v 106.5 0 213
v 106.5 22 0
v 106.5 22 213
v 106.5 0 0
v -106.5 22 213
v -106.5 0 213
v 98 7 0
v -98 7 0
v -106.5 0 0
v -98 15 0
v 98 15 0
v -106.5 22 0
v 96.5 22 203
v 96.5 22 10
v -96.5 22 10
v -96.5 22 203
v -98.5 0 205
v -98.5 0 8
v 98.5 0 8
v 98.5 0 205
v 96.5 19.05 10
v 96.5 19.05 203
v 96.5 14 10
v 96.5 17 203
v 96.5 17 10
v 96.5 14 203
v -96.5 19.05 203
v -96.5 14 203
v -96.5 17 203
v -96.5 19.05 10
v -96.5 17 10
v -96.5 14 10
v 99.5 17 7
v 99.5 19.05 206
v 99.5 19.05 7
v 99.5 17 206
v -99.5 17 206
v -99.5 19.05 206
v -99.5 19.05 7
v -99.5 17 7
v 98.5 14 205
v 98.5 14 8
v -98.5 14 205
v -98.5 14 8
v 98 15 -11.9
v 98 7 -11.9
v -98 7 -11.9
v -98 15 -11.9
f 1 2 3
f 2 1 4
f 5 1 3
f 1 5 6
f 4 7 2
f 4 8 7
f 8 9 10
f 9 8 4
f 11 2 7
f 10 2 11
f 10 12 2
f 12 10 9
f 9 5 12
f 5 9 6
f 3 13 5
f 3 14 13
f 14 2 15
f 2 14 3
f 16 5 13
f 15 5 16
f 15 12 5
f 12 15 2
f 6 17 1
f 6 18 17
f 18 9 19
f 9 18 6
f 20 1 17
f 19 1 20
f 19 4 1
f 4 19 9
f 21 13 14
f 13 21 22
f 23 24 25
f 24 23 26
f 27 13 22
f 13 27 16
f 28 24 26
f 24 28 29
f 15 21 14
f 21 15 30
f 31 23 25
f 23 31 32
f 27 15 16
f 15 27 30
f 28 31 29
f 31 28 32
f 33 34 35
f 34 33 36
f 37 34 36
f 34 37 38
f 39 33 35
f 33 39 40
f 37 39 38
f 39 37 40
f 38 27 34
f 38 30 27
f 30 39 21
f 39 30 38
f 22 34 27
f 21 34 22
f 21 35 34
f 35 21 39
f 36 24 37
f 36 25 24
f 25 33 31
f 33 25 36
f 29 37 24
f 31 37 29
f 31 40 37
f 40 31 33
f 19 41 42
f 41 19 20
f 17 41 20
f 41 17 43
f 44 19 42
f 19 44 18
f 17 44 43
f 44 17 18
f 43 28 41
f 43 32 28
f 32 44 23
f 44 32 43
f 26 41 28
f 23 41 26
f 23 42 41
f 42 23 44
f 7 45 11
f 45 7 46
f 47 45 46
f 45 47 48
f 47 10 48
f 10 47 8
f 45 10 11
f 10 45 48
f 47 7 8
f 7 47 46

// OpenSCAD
// file: params.scad
// ─────────────────────────────────────────────────────────────────────────────
//  params.scad — shared dimensions for every printed part. Edit HERE, once.
//
//  Almost everything is driven off measured hardware. The two things you MUST
//  verify with calipers on your actual parts before printing the base/frame:
//    • panel_w / panel_h / panel_depth  (your 64×64 module's real size)
//    • the 28BYJ-48 mounting-tab hole spacing (usually 35 mm)
//  Defaults below are typical values for a P3 64×64 panel + a stock 28BYJ-48.
// ─────────────────────────────────────────────────────────────────────────────

// Global smoothness
$fn = 120;

// ── RGB matrix panel (P3 64×64) ──────────────────────────────────────────────
panel_px     = 64;
panel_pitch  = 3.0;                 // P3 = 3 mm pixel pitch
panel_w      = panel_px * panel_pitch;   // ≈ 192 mm (measure yours!)
panel_h      = panel_px * panel_pitch;   // ≈ 192 mm
panel_depth  = 14;                  // module thickness incl. LEDs (no connectors)
panel_border = 2;                   // dead PCB border around the lit area

// ── Acrylic diffuser ─────────────────────────────────────────────────────────
diffuser_thick = 2.0;               // frosted acrylic sheet thickness
diffuser_gap   = 3.0;               // air gap panel→acrylic (the "glow" distance)

// ── 28BYJ-48 stepper ─────────────────────────────────────────────────────────
motor_body_dia   = 28.5;            // round body
motor_tab_span   = 35.0;            // centre-to-centre of the two mounting holes
motor_tab_hole   = 4.2;            // M4 screw clearance (tabs are ~4.2 mm)
shaft_dia        = 5.0;             // output shaft
shaft_flat       = 3.0;             // across-flats of the D
shaft_len        = 9.0;             // usable shaft length
motor_shaft_offset = 8.0;           // shaft is offset this far from the body centre

// ── Coupler (motor shaft → record riser) ─────────────────────────────────────
coupler_dia      = 14;              // outer riser diameter
coupler_h        = 14;              // lifts the record above the deck
coupler_boss_dia = 8;               // top boss that plugs into the record
coupler_boss_h   = 4;

// ── Record ───────────────────────────────────────────────────────────────────
// Sized to nest INSIDE the 24-LED ring (~86 mm OD, ~68 mm inner hole) with a
// glowing halo gap all round.
record_dia    = 60;
record_thick  = 2.4;
label_dia     = 22;                 // printed-label recess
label_depth   = 0.6;
record_hole   = coupler_boss_dia + 0.3;  // press-fit onto the coupler boss

// ── WS2812B halo ring (24-LED, ~86 mm OD) ────────────────────────────────────
halo_ring_dia   = 74;               // LED-circle diameter of the 24-LED ring (measure yours!)
halo_channel_w  = 12;               // channel width — holds the ~9 mm-wide ring PCB
halo_channel_d  = 4;                // channel depth

// ── Turntable base / deck ────────────────────────────────────────────────────
// Deck must be wider than the panel (≈192 mm) so the frame slot fits and the
// whole thing doesn't tip. 210 gives a comfortable margin either side.
deck_w      = 210;                  // footprint width  (> panel_w for stability)
deck_d      = 150;                  // footprint depth
deck_top    = 3;                    // top plate thickness
wall_h      = 45;                   // internal height to hide SMPS + ESP32 + wiring
wall_t      = 2.4;                  // wall thickness
frame_slot_w = panel_w + 2*panel_border + 2;   // slot the matrix frame plugs into
frame_slot_t = 8;                   // slot depth (front-to-back) — matches frame tenon
// main file
// ─────────────────────────────────────────────────────────────────────────────
//  matrix_frame.scad — upright frame for the 64×64 panel + frosted diffuser.
//
//  Modelled "as installed" (standing up, front face toward +Y). Layering, front
//  to back, captures the acrylic and holds the panel with a built-in air gap:
//
//     [front bezel]  window 193  ─┐
//     [acrylic recess 199]        │  acrylic trapped between two 193 ledges
//     [gap window 193]  ←gap──────┘  panel front stops on this ledge
//     [panel pocket 197]  (open at the back — insert panel here)
//
//  A full-width tenon under the bottom edge plugs into the base's frame slot.
//  PRINT: lay it face-down (rotate so the front face is on the bed); the tenon
//  then points sideways — fine, no supports needed for the pockets.
// ─────────────────────────────────────────────────────────────────────────────
include <params.scad>

bezel    = 8;
front_t  = 3;

module_w = panel_w + 2*panel_border;
module_h = panel_h + 2*panel_border;

window_w  = panel_w + 1;        // reveal the lit area, hide the PCB border
window_h  = panel_h + 1;
acrylic_w = window_w + 6;       // 3 mm retaining lip all round
acrylic_h = window_h + 6;
pocket_w  = module_w + 1;       // holds the panel module
pocket_h  = module_h + 1;

outer_w = pocket_w + 2*bezel;
outer_h = pocket_h + 2*bezel;
frame_depth = front_t + diffuser_thick + diffuser_gap + panel_depth;

tenon_w = frame_slot_w - 2;
tenon_h = 12;

// A rectangular hole of size (w×h) in the X–Z plane, cut through a Y span.
module yslot(w, h, y0, ylen) {
  translate([-w/2, y0, (outer_h - h)/2]) cube([w, ylen, h]);
}

module frame() {
  difference() {
    // solid blank
    translate([-outer_w/2, 0, 0]) cube([outer_w, frame_depth, outer_h]);

    // through light tube (193): serves the front window AND the gap window
    yslot(window_w, window_h, -0.1, frame_depth + 0.2);

    // acrylic recess (199) in region 2
    yslot(acrylic_w, acrylic_h,
          frame_depth - front_t - diffuser_thick, diffuser_thick + 0.05);

    // panel pocket (197) from the back, region 4
    yslot(pocket_w, pocket_h, -0.1, panel_depth + 0.1);
  }

  // tenon under the bottom edge (drops into the base slot)
  translate([-tenon_w/2, frame_depth/2 - frame_slot_t/2, -tenon_h + 0.1])
    cube([tenon_w, frame_slot_t, tenon_h]);
}

frame();
